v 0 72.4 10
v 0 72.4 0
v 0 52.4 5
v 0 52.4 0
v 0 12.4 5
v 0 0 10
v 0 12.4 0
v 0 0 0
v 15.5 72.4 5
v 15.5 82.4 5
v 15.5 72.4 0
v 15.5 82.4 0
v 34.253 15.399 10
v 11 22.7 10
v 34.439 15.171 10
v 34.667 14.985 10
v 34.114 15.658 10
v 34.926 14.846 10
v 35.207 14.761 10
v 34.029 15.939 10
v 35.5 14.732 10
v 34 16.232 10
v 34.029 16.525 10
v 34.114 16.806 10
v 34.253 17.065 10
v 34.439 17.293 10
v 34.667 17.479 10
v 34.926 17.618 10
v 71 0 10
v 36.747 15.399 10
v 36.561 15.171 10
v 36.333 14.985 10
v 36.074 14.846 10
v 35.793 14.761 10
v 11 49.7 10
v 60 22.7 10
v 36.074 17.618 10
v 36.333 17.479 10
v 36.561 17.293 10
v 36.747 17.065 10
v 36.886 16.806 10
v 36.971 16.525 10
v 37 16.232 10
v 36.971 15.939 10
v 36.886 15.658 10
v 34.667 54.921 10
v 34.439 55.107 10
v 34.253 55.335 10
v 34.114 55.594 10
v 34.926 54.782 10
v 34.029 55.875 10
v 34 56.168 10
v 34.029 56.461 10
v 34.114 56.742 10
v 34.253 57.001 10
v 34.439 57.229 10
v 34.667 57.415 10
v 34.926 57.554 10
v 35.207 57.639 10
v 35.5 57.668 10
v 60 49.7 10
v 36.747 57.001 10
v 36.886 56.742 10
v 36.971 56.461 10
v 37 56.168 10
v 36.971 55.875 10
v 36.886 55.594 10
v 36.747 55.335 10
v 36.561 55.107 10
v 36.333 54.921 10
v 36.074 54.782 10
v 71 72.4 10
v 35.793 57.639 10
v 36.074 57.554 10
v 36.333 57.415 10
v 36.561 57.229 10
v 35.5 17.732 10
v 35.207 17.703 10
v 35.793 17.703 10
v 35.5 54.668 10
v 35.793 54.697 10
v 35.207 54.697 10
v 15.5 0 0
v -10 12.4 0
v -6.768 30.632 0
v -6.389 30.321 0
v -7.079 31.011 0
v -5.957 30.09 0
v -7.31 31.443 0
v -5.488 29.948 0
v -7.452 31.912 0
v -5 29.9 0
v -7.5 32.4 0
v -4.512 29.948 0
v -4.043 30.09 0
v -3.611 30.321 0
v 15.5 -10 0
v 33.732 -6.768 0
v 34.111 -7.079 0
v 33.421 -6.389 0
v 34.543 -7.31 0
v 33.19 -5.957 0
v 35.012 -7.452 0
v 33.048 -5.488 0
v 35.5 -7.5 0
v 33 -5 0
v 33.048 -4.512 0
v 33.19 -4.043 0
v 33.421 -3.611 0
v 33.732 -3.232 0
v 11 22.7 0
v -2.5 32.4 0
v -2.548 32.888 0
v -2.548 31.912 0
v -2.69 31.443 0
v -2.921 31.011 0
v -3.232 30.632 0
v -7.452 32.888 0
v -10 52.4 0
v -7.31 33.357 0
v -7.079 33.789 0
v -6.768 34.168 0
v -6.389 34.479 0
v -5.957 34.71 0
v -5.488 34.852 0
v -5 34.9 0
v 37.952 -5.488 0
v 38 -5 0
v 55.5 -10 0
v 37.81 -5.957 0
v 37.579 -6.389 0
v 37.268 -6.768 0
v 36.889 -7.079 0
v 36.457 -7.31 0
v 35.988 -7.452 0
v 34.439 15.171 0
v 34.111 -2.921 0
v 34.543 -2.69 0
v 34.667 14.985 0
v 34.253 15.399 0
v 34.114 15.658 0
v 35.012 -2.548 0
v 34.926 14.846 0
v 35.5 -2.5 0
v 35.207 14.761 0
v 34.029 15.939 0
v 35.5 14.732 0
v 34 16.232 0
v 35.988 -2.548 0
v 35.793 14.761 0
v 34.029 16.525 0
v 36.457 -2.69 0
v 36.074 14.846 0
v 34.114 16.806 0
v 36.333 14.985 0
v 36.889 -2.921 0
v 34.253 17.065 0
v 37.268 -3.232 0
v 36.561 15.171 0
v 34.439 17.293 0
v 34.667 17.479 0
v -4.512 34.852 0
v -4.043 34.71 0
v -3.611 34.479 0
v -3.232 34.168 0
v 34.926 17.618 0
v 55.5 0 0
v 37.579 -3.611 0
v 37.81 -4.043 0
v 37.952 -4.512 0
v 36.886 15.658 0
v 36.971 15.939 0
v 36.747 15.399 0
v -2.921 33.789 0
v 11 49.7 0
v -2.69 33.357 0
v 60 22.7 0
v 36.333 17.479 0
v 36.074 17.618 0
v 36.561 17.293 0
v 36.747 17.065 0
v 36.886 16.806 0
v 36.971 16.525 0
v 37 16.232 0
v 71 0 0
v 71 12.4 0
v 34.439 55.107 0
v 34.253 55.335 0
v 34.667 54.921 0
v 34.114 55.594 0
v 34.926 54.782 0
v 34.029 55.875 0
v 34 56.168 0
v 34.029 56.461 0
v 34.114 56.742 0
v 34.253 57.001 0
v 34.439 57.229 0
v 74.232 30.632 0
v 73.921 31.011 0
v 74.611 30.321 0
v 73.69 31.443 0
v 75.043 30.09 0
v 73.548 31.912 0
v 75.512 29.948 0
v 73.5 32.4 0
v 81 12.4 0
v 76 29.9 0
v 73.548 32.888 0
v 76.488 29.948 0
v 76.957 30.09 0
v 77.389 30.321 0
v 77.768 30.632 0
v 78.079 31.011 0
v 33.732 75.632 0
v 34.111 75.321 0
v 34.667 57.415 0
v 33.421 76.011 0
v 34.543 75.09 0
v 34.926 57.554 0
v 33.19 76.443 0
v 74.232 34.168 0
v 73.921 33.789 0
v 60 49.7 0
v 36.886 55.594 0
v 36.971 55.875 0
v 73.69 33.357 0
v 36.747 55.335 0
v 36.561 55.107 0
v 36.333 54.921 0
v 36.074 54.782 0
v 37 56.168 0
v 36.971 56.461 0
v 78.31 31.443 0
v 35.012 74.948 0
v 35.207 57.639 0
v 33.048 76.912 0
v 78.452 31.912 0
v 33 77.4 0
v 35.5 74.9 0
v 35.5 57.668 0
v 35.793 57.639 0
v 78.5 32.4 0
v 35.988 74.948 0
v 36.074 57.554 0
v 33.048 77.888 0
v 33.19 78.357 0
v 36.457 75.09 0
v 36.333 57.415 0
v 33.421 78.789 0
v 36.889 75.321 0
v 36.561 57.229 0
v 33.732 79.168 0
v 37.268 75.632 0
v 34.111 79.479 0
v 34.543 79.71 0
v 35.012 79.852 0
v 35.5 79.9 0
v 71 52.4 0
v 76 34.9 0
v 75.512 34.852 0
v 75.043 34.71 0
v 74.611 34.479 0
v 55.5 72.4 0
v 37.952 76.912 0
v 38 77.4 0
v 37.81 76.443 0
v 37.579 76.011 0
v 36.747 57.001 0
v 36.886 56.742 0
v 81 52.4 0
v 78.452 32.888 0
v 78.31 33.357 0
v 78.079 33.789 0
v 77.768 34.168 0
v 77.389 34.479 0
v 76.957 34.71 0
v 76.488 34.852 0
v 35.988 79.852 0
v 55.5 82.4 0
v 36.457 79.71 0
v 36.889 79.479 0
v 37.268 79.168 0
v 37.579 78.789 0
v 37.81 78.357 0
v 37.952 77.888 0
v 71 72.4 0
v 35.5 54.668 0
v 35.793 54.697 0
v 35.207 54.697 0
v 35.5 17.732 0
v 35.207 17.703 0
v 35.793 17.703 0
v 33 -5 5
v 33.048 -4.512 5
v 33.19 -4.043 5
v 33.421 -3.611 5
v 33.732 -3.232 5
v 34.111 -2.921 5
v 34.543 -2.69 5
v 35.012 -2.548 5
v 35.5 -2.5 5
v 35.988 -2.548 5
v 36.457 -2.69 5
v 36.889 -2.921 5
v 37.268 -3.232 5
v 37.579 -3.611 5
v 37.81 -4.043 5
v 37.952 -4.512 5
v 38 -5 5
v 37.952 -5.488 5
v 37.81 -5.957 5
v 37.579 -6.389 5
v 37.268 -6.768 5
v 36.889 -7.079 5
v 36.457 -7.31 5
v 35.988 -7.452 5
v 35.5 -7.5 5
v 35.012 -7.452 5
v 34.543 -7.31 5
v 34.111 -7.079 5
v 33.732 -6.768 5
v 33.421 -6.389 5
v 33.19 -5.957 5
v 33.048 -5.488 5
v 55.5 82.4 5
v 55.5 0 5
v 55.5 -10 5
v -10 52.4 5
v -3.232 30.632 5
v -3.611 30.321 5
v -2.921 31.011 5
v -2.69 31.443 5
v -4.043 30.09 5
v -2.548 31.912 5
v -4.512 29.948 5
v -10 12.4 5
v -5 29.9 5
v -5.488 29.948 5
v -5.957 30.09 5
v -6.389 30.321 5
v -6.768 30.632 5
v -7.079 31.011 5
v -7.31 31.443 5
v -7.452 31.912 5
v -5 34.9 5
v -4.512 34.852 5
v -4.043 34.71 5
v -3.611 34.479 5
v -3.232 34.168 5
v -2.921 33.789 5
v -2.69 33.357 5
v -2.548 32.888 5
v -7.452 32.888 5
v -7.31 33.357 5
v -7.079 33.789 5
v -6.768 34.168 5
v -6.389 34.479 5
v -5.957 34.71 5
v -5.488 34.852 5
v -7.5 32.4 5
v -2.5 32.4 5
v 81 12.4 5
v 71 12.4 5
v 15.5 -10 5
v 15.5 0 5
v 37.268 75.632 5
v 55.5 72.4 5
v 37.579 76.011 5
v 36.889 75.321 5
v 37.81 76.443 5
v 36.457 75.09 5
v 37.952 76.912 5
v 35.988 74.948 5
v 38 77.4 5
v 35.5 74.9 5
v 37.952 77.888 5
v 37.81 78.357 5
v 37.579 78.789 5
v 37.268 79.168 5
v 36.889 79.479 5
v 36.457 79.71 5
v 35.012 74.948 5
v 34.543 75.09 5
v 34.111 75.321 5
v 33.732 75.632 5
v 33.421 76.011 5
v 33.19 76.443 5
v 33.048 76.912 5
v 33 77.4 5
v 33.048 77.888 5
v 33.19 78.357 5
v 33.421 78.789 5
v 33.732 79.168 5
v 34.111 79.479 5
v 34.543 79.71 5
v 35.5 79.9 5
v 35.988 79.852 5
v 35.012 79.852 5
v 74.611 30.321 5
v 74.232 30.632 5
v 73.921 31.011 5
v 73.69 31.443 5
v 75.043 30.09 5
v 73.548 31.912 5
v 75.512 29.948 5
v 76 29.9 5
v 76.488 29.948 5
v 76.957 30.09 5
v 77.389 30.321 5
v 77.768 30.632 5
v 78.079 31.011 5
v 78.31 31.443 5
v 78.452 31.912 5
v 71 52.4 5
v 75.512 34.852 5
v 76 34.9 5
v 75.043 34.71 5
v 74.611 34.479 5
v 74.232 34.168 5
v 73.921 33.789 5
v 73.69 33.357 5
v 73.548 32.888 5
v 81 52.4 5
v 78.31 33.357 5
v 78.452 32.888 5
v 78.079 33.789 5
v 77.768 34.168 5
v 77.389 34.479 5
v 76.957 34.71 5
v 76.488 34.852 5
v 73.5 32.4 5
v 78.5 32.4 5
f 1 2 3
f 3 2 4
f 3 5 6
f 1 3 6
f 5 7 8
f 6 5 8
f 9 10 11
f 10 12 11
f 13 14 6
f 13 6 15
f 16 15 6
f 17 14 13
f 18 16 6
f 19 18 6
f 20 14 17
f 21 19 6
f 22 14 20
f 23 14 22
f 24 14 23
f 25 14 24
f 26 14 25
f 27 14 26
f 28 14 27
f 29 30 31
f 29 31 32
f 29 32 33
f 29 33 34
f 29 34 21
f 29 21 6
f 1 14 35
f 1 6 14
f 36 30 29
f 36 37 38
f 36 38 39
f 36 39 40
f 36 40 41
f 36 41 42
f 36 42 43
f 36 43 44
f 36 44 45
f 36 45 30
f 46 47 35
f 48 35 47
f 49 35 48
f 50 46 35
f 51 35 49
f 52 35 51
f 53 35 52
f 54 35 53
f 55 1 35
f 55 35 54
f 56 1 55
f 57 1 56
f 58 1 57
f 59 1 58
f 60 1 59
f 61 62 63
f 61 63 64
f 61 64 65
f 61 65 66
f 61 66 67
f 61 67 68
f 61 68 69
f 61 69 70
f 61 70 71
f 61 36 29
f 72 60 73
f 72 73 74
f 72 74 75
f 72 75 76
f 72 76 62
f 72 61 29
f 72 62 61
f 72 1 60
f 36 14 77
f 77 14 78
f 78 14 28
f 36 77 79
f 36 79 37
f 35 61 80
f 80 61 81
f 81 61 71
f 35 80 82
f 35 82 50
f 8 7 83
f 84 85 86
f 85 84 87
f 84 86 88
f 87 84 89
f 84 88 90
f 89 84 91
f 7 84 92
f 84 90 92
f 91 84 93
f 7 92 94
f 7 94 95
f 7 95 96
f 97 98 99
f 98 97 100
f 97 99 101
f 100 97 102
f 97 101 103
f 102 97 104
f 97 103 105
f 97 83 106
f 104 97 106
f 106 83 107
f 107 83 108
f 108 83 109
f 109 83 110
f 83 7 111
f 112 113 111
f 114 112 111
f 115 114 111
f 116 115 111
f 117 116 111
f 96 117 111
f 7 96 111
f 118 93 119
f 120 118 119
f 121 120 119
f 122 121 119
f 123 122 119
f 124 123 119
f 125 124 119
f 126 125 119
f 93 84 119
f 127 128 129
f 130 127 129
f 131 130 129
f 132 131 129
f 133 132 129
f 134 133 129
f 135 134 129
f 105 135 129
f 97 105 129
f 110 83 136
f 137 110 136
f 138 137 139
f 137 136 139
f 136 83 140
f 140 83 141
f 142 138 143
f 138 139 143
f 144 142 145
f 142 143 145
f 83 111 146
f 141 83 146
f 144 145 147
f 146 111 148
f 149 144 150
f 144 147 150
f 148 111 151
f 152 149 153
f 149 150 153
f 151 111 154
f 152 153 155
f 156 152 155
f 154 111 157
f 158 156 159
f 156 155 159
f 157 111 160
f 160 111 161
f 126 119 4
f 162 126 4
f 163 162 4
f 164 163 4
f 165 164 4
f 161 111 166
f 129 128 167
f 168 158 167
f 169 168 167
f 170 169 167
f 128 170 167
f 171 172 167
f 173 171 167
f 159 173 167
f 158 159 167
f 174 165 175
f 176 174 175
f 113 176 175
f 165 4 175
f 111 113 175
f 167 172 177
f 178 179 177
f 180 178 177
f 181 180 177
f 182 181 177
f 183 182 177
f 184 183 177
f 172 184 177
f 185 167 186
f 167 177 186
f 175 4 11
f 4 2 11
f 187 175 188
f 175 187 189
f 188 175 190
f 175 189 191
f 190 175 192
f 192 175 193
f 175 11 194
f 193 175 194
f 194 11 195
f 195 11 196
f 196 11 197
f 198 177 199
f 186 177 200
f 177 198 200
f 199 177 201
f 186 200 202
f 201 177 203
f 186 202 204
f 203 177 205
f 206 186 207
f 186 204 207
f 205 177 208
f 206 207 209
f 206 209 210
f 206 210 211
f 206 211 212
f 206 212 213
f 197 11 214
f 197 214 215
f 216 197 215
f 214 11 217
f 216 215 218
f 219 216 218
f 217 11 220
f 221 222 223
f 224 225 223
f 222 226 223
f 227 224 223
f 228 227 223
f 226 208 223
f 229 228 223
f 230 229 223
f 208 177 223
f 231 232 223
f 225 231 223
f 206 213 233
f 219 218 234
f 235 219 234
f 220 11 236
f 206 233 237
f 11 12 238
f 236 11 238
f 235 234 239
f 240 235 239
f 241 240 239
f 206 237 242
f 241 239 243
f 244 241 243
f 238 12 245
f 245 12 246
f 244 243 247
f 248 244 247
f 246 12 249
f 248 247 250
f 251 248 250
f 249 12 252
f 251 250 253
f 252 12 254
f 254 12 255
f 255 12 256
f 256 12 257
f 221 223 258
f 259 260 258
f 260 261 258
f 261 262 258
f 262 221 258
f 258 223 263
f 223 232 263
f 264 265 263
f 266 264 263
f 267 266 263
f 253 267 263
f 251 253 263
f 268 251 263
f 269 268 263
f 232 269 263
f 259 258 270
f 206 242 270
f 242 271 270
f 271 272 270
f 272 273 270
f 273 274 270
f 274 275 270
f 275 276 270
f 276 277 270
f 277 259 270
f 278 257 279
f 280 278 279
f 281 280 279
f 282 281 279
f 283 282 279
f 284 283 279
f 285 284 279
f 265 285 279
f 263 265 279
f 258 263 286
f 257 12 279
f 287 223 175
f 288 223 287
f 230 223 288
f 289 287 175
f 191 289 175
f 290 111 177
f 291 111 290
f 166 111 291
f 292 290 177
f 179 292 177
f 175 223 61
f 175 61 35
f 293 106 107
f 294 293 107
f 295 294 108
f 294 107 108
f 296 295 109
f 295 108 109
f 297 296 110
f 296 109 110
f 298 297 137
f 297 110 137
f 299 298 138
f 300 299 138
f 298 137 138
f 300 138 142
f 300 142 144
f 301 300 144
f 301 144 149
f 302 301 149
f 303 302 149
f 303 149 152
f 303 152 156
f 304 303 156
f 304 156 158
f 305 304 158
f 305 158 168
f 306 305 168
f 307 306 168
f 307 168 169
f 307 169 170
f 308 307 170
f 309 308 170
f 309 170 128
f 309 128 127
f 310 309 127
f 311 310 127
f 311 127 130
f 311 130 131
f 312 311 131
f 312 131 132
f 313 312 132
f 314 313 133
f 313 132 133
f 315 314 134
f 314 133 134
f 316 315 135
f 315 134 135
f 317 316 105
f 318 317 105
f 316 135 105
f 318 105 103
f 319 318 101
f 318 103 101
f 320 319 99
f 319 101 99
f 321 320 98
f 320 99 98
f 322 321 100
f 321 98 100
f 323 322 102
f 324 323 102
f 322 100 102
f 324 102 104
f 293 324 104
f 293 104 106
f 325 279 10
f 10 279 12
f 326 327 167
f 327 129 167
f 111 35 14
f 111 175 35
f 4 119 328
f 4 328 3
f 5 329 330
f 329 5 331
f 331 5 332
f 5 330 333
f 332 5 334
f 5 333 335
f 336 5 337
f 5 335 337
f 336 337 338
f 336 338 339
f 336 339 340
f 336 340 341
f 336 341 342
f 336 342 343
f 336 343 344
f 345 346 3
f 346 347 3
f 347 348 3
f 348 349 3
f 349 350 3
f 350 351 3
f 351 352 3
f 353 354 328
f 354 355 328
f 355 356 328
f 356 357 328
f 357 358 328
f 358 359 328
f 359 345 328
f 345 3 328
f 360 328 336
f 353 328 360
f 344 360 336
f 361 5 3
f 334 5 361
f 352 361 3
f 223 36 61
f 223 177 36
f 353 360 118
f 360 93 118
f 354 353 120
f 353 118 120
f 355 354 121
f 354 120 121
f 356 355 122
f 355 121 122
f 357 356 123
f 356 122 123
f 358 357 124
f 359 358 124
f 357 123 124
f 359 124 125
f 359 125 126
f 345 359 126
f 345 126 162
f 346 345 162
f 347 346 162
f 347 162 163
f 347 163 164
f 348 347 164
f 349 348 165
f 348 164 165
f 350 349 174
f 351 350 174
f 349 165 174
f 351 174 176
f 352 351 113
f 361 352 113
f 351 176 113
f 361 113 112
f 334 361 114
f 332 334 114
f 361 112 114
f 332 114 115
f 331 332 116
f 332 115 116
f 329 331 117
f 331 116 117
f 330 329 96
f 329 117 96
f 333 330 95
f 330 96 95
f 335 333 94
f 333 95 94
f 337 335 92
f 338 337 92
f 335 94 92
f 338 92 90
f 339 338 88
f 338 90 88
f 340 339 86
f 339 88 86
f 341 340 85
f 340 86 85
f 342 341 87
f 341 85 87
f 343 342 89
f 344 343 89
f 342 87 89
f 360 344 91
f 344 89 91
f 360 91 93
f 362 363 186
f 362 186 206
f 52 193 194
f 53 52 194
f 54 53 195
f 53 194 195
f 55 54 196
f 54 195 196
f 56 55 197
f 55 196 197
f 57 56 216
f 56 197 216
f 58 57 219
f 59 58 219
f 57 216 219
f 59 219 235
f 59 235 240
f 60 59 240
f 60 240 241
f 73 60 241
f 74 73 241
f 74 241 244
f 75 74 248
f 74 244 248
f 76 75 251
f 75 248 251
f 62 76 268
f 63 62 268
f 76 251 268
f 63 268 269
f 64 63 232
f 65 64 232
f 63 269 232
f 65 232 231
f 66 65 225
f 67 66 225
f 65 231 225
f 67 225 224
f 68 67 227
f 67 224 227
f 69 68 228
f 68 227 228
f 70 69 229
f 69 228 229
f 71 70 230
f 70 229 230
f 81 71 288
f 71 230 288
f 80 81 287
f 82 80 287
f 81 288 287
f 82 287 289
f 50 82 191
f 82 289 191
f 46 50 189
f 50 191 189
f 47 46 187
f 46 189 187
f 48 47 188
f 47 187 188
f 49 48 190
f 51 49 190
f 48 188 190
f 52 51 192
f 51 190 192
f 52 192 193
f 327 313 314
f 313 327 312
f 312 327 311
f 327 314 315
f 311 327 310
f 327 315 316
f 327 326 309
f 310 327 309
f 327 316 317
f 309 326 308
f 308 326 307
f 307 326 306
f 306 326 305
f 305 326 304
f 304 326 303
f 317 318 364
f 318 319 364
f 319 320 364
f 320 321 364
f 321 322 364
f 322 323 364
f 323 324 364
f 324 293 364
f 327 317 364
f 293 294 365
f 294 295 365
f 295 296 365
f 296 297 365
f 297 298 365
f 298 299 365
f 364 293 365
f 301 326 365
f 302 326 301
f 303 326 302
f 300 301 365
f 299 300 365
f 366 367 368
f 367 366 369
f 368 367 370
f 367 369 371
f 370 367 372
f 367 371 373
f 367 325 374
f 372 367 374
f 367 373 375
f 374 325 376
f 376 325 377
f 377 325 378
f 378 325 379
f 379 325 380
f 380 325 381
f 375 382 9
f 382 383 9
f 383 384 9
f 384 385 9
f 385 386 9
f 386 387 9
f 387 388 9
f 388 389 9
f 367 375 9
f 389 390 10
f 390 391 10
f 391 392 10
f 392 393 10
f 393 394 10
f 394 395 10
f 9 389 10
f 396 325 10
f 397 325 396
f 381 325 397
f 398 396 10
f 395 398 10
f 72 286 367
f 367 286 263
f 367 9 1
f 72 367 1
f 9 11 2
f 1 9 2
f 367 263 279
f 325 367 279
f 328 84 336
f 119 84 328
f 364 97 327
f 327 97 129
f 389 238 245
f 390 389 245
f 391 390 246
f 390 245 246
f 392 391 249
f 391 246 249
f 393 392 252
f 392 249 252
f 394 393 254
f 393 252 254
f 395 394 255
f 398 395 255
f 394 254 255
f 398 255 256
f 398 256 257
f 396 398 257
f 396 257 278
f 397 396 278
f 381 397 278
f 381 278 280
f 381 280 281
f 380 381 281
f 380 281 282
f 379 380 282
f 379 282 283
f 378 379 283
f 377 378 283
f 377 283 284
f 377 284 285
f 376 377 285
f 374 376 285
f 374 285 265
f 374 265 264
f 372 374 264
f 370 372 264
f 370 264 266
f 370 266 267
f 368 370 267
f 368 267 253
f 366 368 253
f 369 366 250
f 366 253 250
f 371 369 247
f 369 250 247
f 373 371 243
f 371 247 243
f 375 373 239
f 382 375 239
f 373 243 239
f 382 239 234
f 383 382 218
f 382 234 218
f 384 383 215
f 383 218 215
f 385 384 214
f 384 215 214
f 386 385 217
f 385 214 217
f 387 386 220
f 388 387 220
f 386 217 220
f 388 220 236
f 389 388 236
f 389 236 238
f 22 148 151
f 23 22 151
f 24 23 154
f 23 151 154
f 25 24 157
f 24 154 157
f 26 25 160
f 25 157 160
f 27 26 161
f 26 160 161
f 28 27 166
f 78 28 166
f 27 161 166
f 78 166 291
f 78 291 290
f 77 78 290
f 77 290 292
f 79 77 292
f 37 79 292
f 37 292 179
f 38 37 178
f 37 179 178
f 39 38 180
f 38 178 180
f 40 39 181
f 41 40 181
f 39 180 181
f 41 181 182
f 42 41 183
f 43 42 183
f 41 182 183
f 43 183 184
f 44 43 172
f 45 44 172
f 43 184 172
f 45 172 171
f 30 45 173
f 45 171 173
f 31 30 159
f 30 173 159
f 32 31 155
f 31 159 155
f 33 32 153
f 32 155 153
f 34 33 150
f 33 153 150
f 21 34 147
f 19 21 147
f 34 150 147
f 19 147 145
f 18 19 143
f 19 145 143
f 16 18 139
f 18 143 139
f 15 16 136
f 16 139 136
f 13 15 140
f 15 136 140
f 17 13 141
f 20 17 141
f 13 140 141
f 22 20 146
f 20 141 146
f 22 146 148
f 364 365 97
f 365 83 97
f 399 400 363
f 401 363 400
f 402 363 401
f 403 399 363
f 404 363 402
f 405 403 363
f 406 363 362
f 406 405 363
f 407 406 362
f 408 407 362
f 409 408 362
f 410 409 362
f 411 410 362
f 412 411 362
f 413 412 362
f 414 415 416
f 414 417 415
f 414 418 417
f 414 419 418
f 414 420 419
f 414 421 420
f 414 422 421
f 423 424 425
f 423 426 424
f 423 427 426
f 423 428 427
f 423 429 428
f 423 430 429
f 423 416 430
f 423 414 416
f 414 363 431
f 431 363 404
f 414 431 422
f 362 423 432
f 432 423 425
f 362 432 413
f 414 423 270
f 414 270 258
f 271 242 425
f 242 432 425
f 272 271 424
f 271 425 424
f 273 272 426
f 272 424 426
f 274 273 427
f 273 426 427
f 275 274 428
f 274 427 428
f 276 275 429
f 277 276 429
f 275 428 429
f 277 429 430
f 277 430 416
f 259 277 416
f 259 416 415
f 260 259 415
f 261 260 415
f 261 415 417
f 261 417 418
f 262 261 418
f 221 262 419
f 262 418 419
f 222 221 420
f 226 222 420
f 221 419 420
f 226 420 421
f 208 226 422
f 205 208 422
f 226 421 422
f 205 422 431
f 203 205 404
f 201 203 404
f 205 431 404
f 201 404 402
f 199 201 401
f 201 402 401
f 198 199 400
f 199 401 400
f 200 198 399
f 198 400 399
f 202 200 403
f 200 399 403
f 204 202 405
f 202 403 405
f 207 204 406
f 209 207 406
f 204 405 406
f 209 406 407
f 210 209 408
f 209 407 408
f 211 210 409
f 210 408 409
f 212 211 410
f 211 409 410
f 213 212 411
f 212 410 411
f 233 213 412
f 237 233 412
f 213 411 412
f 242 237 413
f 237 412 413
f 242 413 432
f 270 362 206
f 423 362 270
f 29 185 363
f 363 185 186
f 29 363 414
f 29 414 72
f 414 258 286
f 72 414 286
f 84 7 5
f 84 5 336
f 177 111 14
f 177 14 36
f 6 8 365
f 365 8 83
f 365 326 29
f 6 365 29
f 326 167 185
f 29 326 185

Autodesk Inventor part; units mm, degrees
ref_plane "YZ Plane" through (0, 0, 0) normal (1, 0, 0) x (0, 1, 0)
ref_plane "XZ Plane" through (0, 0, 0) normal (0, 1, 0) x (-1, 0, 0)
ref_plane "XY Plane" through (0, 0, 0) normal (0, 0, 1) x (1, 0, 0)
sketch "Sketch1" plane through (0, 0, 0) normal (0, 0, 1) x (1, 0, 0)
  line L0 (0, 0) -> (71, 0)
  line L1 (71, 0) -> (71, 72.4)
  line L2 (71, 72.4) -> (0, 72.4)
  line L3 (0, 72.4) -> (0, 0)
  dimension "d0" = 71
  dimension "d1" = 72.4
extrude "Extrusion1" add sketch "Sketch1" along normal blind 10
sketch "Sketch2" plane through (0, 0, 10) normal (0, 0, 1) x (1, 0, 0)
  line L0 (71, 0) -> (71, 72.4) projected
  line L1 (71, 12.4) -> (81, 12.4)
  line L2 (81, 12.4) -> (81, 52.4)
  line L3 (81, 52.4) -> (71, 52.4)
  line L4 (71, 52.4) -> (71, 12.4)
  line L5 (71, 72.4) -> (0, 72.4) projected
  circle A0 centre (76, 32.4) radius 2.5
  line L6 (0, 0) -> (71, 0) projected
  point P0 (81, 32.4)
  point P1 (76, 52.4)
  dimension "d4" = 10
  dimension "d5" = 40
  dimension "d7" = 5
  dimension "d53" = 20
extrude "Extrusion2" add sketch "Sketch2" against normal blind 10
sketch "Sketch3" plane through (0, 0, 10) normal (0, 0, 1) x (1, 0, 0)
  line L0 (71, 52.4) -> (81, 52.4) projected
  line L1 (71, 12.4) -> (81, 12.4) projected
  line L2 (81, 52.4) -> (71, 52.4)
  line L3 (71, 52.4) -> (71, 12.4)
  line L4 (71, 12.4) -> (81, 12.4)
  line L5 (81, 12.4) -> (81, 52.4)
  point P0 (0, 0)
extrude "Extrusion3" cut sketch "Sketch3" against normal blind 5
sketch "Sketch10" plane through (0, 0, 0) normal (0, 0, -1) x (-1, 0, 0)
  line L0 (0, 72.4) -> (0, 0) projected
  line L1 (0, 12.4) -> (10, 12.4)
  line L2 (10, 12.4) -> (10, 52.4)
  line L3 (10, 52.4) -> (0, 52.4)
  line L4 (0, 52.4) -> (0, 12.4)
  circle A0 centre (5, 32.4) radius 2.5
  point P0 (-81, 12.4)
  point P1 (10, 32.4)
  point P2 (5, 12.4)
  dimension "d40" = 10
  dimension "d41" = 40
  dimension "d42" = 5
extrude "Extrusion10" add sketch "Sketch10" against normal blind 5
sketch "Sketch11" plane through (0, 0, 0) normal (0, 0, -1) x (-1, 0, 0)
  line L0 (-71, 72.4) -> (0, 72.4) projected
  line L1 (-15.5, 72.4) -> (-55.5, 72.4)
  line L2 (-55.5, 72.4) -> (-55.5, 82.4)
  line L3 (-55.5, 82.4) -> (-15.5, 82.4)
  line L4 (-15.5, 82.4) -> (-15.5, 72.4)
  circle A0 centre (-35.5, 77.4) radius 2.5
  point P0 (0, 0)
  point P1 (-35.5, 82.4)
  point P2 (-35.5, 72.4)
  point P3 (-15.5, 77.4)
  dimension "d46" = 40
  dimension "d47" = 10
  dimension "d48" = 5
extrude "Extrusion11" add sketch "Sketch11" against normal blind 5
sketch "Sketch12" plane through (0, 0, 0) normal (0, 0, -1) x (-1, 0, 0)
  line L0 (0, 0) -> (-71, 0) projected
  line L1 (-55.5, 0) -> (-15.5, 0)
  line L2 (-15.5, 0) -> (-15.5, -10)
  line L3 (-15.5, -10) -> (-55.5, -10)
  line L4 (-55.5, -10) -> (-55.5, 0)
  circle A0 centre (-35.5, -5) radius 2.5
  point P0 (-55.5, 82.4)
  point P1 (-15.5, 82.4)
  point P2 (-35.5, -10)
  point P3 (-55.5, -5)
  dimension "d54" = 10
  dimension "d55" = 5
extrude "Extrusion12" add sketch "Sketch12" against normal blind 5
sketch "Sketch13" plane through (0, 0, 0) normal (0, 0, -1) x (-1, 0, 0)
  line L0 (-11, 22.7) -> (-60, 22.7)
  line L1 (-60, 22.7) -> (-60, 49.7)
  line L2 (-60, 49.7) -> (-11, 49.7)
  line L3 (-11, 49.7) -> (-11, 22.7)
  line L4 (0, 0) -> (-71, 0) projected
  line L5 (-71, 72.4) -> (0, 72.4) projected
  line L6 (-71, 0) -> (0, 0)
  line L7 (0, 0) -> (0, 72.4)
  line L8 (0, 72.4) -> (-71, 72.4)
  line L9 (-71, 72.4) -> (-71, 0)
  line L10 (-35.5, 56.1679) -> (-35.5, 16.2321) construction
  circle A0 centre (-35.5, 16.2321) radius 1.5
  circle A1 centre (-35.5, 56.1679) radius 1.5
  point P0 (-60, 36.2)
  point P1 (-71, 36.2)
  point P2 (-35.5, 49.7)
  point P3 (-35.5, 72.4)
  point P4 (-35.5, 36.2)
  dimension "d58" = 49
  dimension "d59" = 27
  dimension "d60" = 39.9357
  dimension "d61" = 3
  dimension "d62" = 3
extrude "Extrusion13" cut sketch "Sketch13" against normal through all contours L0 L1 L2 L3 | A0 | A1
properties part number "SP002" material "ABS Plastic"
